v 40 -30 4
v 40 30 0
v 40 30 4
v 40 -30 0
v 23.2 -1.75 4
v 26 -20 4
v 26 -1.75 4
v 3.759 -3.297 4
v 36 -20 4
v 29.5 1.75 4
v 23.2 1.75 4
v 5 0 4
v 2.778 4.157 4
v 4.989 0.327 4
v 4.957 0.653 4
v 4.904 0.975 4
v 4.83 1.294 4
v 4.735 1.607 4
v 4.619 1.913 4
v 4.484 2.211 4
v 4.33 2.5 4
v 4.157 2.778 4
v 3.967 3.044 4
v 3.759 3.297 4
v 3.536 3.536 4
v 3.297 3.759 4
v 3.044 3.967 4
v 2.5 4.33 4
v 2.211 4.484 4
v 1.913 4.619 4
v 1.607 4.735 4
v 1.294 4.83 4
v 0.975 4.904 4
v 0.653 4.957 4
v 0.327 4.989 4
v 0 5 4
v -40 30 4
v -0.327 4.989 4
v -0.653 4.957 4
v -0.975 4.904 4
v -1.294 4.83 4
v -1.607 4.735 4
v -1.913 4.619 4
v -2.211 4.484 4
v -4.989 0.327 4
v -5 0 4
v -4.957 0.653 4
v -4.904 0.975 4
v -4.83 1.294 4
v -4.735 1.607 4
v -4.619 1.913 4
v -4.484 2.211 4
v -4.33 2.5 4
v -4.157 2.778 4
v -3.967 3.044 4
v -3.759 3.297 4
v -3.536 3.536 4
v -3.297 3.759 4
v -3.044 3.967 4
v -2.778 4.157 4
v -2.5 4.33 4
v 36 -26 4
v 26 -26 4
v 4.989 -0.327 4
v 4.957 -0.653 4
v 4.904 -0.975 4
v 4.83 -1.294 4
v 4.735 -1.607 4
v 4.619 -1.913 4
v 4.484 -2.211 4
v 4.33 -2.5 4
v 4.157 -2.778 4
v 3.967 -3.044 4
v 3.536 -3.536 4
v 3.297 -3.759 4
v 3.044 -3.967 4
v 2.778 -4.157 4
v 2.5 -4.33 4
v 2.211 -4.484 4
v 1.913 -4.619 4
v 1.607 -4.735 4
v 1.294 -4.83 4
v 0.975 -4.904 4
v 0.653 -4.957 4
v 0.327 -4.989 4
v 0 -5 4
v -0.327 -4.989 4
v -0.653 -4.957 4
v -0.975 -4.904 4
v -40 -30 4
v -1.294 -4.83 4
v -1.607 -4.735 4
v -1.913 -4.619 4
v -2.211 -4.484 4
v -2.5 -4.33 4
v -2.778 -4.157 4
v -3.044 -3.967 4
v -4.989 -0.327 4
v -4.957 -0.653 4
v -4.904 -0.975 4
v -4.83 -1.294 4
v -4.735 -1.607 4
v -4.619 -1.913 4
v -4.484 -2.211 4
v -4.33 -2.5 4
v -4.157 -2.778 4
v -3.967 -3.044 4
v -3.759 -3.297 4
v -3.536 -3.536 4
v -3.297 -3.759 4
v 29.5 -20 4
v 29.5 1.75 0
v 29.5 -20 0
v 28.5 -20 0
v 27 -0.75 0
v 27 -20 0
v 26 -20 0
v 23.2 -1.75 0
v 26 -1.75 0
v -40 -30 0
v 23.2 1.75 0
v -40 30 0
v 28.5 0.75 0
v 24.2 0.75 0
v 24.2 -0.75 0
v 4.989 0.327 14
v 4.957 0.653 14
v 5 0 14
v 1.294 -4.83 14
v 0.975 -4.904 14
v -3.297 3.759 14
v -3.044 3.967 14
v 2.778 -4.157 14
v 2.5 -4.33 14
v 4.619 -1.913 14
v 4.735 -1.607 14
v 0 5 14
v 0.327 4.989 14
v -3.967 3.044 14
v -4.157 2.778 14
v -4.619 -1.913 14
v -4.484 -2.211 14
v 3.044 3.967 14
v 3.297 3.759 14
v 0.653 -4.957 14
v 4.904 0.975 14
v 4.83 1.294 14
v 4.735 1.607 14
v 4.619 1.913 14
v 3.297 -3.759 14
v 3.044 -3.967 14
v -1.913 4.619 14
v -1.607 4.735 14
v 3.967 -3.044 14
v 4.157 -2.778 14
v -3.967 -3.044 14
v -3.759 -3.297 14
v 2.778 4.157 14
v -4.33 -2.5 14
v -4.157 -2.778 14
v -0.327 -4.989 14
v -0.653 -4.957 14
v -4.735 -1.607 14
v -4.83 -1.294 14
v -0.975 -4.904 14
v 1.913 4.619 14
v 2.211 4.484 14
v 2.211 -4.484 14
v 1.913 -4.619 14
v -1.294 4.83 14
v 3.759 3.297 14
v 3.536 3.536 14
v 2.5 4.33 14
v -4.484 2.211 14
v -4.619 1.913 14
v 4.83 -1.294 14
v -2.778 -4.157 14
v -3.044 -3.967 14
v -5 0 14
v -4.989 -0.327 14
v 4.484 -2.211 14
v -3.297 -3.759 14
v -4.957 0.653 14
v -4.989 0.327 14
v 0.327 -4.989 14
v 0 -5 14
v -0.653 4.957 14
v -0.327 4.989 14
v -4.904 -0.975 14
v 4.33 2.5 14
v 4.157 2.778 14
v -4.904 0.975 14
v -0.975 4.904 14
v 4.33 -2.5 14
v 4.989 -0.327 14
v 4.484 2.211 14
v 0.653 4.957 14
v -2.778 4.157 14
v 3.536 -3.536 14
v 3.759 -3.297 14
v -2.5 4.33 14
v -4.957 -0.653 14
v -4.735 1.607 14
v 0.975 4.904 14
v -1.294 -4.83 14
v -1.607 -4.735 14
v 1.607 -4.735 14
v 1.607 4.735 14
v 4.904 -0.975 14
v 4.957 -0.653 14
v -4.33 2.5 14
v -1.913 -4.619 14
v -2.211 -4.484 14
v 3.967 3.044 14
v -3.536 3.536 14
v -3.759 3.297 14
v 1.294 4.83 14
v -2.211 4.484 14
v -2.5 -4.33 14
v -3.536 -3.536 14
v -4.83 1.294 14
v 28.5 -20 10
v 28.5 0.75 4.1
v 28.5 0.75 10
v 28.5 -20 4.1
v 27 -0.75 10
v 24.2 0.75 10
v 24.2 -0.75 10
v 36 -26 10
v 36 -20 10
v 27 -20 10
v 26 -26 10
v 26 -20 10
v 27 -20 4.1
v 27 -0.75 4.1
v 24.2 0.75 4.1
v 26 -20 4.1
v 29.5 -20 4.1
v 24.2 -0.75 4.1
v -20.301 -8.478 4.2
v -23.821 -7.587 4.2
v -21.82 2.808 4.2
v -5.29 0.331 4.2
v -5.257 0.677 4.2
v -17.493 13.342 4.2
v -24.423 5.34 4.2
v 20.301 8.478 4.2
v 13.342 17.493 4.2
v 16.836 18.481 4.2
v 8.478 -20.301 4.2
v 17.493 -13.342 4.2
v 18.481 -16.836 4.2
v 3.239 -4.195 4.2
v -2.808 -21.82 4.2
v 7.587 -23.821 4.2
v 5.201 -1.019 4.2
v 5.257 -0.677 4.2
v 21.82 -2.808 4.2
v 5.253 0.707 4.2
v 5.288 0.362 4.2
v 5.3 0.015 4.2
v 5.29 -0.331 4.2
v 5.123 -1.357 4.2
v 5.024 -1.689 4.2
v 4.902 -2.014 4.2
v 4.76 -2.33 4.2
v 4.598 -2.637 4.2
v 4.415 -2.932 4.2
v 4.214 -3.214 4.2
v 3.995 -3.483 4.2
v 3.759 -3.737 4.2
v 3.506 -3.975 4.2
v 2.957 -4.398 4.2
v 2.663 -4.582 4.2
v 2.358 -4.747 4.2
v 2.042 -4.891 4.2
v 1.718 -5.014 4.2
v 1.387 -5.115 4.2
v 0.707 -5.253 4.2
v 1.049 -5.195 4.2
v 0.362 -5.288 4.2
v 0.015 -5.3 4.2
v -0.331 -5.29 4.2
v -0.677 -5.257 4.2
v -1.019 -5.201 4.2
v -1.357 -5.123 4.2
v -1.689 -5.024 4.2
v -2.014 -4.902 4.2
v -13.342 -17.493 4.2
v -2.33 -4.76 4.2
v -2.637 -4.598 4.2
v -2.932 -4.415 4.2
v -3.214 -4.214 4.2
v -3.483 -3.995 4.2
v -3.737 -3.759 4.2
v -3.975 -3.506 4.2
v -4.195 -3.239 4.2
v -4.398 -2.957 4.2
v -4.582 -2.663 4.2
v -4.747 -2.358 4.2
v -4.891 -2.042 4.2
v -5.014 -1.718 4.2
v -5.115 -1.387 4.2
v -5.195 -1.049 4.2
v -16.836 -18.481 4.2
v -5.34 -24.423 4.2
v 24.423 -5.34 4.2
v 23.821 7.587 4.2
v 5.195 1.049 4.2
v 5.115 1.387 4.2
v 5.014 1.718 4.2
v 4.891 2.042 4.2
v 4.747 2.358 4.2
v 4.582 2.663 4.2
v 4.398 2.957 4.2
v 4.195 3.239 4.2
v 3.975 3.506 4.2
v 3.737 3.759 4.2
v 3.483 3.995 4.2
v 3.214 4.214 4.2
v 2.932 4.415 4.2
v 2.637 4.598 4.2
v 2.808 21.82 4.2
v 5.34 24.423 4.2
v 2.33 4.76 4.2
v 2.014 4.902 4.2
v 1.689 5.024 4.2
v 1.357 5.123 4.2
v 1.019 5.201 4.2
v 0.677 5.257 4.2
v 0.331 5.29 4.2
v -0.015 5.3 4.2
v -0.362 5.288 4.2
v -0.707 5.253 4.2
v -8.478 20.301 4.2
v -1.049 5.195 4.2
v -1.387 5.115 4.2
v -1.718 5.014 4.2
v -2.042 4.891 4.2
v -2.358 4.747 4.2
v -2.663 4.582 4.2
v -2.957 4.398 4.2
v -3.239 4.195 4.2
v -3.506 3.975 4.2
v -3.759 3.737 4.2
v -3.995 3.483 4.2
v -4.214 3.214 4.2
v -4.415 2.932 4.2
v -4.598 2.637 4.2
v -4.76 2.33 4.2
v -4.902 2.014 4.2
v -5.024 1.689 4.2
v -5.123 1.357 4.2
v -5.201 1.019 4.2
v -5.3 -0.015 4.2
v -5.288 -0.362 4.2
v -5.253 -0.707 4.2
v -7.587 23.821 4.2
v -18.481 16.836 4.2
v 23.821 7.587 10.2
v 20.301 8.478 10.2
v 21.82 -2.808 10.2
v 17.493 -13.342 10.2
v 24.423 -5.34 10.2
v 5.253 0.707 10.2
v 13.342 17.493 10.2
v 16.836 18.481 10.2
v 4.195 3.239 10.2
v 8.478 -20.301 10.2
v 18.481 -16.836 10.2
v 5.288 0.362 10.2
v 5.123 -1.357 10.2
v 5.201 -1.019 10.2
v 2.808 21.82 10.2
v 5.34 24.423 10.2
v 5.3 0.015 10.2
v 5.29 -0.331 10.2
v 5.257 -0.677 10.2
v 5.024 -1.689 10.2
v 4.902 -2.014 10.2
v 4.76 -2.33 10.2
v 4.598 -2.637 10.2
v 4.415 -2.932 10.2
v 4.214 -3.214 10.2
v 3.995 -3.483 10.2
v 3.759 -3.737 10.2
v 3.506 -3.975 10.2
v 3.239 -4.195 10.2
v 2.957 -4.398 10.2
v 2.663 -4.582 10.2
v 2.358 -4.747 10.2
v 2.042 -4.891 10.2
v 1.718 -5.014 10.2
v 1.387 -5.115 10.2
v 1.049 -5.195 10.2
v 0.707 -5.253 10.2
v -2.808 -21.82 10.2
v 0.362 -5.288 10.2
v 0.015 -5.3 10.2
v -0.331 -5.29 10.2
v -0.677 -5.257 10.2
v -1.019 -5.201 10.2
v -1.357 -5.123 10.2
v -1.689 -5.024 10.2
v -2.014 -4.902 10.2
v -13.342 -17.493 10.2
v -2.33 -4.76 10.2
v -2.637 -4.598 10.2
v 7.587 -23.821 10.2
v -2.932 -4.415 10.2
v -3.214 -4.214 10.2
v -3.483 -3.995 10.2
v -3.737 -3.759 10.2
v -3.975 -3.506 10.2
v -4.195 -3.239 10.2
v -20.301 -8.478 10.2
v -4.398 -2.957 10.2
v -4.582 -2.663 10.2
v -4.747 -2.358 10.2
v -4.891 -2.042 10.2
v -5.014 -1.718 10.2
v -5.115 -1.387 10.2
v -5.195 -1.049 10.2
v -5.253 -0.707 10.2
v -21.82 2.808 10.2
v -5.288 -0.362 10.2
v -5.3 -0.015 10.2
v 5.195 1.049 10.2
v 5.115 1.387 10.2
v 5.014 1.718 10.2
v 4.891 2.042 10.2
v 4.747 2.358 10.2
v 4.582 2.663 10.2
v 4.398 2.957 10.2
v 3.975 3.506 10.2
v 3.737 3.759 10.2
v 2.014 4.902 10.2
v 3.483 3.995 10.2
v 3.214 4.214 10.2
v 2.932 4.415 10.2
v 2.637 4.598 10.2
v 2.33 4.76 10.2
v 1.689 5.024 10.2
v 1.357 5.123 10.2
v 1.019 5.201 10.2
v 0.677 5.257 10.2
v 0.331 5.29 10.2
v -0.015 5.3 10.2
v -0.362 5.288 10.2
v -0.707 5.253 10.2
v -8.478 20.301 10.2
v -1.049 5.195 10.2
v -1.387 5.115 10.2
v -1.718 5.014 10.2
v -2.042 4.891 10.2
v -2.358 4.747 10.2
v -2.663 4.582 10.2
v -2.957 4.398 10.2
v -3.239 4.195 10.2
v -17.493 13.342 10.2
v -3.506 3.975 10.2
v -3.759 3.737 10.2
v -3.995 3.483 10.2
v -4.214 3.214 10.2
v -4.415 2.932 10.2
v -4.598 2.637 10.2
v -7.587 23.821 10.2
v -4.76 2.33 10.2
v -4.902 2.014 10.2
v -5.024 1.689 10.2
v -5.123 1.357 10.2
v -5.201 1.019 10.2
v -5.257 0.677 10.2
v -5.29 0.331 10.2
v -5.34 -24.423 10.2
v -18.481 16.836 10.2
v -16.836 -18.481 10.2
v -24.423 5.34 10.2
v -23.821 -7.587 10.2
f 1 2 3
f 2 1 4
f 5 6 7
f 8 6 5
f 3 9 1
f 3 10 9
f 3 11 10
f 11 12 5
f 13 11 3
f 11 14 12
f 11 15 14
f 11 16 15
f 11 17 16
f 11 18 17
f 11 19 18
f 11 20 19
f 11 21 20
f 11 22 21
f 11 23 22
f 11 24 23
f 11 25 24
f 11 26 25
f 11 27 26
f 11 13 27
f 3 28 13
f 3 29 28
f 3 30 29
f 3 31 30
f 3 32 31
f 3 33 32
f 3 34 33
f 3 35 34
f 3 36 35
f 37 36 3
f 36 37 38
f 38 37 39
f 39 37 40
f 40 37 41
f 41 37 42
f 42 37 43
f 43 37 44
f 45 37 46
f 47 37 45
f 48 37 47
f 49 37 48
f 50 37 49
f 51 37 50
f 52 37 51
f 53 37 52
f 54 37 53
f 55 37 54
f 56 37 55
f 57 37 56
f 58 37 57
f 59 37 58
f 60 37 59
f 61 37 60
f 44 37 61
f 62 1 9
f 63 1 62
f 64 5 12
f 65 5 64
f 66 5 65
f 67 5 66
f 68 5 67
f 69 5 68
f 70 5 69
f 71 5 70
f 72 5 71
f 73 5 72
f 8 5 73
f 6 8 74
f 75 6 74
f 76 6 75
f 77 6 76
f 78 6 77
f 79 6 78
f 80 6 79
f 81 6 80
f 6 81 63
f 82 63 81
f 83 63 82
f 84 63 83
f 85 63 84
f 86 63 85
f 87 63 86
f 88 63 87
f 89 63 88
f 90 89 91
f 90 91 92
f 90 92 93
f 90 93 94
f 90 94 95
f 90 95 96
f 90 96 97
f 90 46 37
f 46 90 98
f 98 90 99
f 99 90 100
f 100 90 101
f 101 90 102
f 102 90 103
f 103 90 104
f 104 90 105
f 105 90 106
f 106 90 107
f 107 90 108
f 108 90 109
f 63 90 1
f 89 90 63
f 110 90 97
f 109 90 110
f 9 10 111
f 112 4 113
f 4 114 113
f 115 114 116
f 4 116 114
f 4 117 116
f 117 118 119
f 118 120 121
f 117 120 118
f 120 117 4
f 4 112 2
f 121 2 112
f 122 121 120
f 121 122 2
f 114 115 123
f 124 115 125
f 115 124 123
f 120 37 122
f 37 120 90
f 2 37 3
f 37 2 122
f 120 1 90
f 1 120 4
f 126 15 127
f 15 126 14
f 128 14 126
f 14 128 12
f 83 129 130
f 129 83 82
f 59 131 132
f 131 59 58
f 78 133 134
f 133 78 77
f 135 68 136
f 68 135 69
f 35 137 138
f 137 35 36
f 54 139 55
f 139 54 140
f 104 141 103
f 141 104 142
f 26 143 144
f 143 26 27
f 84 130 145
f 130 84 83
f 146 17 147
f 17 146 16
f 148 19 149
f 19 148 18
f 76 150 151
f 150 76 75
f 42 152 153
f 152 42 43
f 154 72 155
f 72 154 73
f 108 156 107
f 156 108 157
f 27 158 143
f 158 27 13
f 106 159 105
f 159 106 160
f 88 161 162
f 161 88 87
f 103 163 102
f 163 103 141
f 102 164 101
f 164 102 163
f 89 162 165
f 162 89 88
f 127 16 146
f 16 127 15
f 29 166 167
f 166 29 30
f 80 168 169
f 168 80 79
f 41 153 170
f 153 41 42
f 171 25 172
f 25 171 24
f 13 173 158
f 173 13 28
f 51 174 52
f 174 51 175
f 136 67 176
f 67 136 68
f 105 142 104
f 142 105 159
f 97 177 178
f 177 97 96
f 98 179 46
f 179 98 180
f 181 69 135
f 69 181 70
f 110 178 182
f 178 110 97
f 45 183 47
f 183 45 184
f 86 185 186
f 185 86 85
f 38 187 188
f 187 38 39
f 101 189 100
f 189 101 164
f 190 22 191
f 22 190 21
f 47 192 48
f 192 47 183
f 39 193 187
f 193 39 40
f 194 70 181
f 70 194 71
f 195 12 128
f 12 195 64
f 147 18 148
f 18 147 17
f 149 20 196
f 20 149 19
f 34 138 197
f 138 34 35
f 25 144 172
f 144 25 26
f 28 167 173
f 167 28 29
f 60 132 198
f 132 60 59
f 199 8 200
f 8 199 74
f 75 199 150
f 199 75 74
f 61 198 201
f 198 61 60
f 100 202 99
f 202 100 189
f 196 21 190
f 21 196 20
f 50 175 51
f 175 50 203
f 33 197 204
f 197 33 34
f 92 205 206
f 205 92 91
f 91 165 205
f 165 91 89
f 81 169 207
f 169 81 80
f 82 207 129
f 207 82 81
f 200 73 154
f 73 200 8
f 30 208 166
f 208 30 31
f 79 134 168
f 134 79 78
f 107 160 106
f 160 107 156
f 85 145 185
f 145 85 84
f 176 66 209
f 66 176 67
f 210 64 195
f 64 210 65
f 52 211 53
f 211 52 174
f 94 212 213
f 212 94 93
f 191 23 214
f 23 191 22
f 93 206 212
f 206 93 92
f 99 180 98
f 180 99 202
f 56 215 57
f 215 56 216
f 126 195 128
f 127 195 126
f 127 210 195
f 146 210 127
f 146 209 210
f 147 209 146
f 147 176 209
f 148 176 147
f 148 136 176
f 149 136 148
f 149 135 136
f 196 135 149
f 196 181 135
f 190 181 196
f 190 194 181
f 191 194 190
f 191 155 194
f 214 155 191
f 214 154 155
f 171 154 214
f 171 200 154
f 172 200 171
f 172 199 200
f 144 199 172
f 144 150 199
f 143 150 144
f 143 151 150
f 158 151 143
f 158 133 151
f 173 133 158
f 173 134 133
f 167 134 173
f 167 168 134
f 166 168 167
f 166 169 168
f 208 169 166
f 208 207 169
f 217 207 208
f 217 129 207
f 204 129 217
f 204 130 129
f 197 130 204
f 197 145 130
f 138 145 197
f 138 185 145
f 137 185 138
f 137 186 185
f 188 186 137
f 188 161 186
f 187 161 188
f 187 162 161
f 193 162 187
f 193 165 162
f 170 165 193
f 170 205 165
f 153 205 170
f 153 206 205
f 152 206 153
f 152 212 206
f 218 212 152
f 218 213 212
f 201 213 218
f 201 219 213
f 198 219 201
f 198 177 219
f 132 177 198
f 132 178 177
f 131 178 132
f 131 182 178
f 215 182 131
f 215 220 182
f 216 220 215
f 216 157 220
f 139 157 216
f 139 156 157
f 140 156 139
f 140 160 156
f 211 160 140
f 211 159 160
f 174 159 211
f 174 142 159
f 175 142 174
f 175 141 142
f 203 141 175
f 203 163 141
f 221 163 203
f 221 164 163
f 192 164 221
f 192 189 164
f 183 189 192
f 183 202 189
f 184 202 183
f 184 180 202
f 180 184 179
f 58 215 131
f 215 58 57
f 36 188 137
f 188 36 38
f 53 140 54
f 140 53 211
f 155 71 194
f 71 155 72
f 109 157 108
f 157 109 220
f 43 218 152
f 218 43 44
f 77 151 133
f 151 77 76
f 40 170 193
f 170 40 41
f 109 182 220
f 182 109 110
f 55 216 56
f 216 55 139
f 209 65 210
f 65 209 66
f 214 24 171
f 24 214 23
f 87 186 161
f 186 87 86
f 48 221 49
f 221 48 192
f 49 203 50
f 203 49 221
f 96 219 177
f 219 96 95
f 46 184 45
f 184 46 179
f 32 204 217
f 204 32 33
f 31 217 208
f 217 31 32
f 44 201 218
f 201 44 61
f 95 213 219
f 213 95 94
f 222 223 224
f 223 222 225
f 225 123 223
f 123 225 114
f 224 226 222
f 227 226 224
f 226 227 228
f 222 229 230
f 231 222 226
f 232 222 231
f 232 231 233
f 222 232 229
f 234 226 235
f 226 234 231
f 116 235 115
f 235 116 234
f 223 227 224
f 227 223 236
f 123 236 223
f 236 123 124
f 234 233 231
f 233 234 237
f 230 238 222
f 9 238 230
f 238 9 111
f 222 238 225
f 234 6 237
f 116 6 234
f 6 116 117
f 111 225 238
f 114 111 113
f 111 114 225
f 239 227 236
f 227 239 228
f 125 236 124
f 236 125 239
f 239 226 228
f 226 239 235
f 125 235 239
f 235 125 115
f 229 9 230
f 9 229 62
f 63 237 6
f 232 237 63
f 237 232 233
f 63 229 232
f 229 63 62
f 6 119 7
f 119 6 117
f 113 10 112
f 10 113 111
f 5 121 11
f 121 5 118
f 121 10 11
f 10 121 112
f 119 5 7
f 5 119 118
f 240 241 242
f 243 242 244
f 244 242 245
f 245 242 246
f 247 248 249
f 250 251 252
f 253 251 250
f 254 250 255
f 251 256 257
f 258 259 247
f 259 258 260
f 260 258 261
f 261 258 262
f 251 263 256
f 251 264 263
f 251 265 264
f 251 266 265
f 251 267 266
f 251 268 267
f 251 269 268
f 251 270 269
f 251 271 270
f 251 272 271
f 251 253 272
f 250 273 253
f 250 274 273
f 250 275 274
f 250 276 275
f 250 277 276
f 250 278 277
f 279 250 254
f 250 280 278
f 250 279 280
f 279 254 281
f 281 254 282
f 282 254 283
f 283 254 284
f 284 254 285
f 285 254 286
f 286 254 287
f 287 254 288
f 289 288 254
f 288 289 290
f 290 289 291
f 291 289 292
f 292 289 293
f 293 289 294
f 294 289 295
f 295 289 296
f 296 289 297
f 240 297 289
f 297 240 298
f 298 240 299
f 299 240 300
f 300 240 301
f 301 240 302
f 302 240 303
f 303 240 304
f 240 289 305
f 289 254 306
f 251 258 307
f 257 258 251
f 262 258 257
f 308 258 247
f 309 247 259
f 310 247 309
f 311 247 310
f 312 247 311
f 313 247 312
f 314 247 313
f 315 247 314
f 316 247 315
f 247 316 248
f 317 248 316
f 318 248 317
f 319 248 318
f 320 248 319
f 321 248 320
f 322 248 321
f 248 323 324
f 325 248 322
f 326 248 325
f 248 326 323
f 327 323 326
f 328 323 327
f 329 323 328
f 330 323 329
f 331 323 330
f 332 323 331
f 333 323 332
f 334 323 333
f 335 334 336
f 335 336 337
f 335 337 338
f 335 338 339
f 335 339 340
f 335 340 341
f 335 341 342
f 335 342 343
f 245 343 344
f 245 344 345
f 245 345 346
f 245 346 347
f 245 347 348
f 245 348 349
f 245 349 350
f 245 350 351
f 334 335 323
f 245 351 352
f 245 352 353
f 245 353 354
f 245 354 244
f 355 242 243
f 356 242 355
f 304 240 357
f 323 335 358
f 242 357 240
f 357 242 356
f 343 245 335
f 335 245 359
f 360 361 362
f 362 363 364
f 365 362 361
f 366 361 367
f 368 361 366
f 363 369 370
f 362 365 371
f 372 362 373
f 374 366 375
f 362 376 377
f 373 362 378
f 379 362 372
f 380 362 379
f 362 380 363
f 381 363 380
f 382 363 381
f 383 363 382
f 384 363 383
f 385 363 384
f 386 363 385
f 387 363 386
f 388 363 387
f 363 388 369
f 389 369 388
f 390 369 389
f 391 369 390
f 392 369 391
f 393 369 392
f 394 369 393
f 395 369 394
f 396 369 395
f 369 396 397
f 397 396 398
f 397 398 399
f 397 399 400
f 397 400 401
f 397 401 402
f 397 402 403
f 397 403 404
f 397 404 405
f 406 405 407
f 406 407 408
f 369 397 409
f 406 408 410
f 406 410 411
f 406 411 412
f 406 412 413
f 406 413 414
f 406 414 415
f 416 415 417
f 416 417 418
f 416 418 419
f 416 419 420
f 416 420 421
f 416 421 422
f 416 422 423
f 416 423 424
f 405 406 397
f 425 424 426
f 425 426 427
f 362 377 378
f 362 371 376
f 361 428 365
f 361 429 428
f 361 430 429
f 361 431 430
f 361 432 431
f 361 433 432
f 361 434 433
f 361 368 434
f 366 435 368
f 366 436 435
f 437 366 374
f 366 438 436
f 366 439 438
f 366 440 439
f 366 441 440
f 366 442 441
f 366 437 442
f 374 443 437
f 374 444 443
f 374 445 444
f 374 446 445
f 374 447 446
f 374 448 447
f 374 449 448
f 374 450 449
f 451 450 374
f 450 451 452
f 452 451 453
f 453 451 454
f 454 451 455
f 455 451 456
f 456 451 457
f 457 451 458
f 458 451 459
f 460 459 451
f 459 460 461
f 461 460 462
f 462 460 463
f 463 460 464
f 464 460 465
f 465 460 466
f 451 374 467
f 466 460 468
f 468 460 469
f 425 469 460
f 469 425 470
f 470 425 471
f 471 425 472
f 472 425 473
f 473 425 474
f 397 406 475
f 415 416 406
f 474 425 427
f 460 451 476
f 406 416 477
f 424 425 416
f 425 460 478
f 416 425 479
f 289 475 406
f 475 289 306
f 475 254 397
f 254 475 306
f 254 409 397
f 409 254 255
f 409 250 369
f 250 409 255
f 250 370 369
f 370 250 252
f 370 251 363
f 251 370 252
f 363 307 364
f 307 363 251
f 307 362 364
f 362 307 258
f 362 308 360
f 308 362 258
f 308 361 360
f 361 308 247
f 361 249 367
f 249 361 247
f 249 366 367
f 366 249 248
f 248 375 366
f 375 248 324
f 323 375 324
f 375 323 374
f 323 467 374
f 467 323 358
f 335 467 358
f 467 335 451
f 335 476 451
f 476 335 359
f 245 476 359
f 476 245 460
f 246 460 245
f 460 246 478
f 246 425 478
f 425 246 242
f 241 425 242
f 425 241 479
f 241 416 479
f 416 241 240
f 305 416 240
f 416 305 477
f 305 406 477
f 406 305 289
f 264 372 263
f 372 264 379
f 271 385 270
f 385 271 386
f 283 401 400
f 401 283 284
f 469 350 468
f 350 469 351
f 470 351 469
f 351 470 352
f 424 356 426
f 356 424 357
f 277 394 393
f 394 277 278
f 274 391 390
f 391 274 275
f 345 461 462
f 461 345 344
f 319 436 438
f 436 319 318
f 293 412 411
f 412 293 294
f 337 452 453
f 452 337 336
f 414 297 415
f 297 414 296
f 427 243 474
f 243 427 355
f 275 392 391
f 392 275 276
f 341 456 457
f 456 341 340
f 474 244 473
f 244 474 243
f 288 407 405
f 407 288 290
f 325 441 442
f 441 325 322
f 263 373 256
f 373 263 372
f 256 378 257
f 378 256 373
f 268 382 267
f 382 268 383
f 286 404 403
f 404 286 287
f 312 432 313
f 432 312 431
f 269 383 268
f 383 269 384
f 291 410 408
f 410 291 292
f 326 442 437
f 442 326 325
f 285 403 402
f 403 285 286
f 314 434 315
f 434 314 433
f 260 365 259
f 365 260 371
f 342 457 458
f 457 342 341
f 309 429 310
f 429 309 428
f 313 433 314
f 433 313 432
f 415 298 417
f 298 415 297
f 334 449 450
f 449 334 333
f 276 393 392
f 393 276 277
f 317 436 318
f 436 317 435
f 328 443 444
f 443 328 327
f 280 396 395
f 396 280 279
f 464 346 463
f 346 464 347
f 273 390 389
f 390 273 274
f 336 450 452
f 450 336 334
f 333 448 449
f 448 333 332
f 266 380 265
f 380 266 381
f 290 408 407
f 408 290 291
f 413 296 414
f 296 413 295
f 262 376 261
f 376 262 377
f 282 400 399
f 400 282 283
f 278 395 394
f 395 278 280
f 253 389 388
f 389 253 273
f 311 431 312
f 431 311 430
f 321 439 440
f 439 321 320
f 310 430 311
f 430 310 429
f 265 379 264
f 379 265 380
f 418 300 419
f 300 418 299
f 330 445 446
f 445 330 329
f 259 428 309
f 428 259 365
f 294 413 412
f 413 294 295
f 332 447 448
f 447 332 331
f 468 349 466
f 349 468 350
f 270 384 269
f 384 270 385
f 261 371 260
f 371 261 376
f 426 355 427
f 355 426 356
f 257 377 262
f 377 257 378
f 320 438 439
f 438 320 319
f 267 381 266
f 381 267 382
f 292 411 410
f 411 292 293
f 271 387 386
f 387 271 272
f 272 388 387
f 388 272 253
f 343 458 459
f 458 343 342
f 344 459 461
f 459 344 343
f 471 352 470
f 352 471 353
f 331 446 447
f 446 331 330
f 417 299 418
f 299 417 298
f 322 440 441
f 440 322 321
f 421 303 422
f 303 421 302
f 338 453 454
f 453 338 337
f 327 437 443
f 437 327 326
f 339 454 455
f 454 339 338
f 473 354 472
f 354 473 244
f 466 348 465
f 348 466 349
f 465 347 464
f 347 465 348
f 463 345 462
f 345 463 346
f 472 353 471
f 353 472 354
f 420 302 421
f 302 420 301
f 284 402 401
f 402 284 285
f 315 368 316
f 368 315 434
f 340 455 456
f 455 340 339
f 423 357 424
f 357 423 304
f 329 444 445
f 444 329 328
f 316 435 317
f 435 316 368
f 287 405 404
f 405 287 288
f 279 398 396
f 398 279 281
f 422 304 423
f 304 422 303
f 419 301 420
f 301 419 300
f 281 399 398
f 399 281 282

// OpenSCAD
cadverify_only = "";
module instance(name, part, unit = 1) {
    echo(cadverify_instance = [name, part, unit]);
    if (cadverify_only == "" || cadverify_only == name) children();
}

// Part selector: base, wheel, assembly
part = "assembly"; // [base, wheel, assembly]

$fn = 96;

// Parameters
Rt = 25;        // wheel tip radius (50mm across)
Rr = 22;        // wheel root radius
Nteeth = 12;
wheel_t = 6;    // wheel thickness
bore_r = 5.3;   // wheel bore radius (post 5.0 + 0.3 clearance)
post_r = 5;
post_h = 14;    // base bottom to post top
base_t = 4;     // base plate thickness
plate_x = 80;
plate_y = 60;
gap_angle = 37.3333333; // gap center for nominal assembly

module wheel() {
    pts = [ for (k=[0:2*Nteeth-1])
        let(i=floor(k/2),
            a = (k%2==0) ? i*360/Nteeth : i*360/Nteeth+25,
            r = (k%2==0) ? Rr : Rt)
        [r*cos(a), r*sin(a)] ];
    difference() {
        linear_extrude(height=wheel_t, convexity=4)
            polygon(pts);
        translate([0,0,-0.1])
            cylinder(h=wheel_t+0.2, r=bore_r);
    }
}

module base() {
    difference() {
        union() {
            // plate
            translate([-plate_x/2, -plate_y/2, 0])
                cube([plate_x, plate_y, base_t]);
            // post
            cylinder(h=post_h, r=post_r);
            // pawl backbone (tall)
            translate([27, -20, 0])
                cube([1.5, 20.75, 10]);
            // pawl finger (tall, radial)
            translate([24.2, -0.75, 0])
                cube([4.3, 1.5, 10]);
            // anchor block (full height fixation)
            translate([26, -26, 0])
                cube([10, 6, 10]);
        }
        // slot voids through plate (z -0.1..4.1)
        translate([26, -20, -0.1]) cube([1, 19.25, 4.2]);      // west of backbone
        translate([28.5, -20, -0.1]) cube([1, 20.75, 4.2]);    // east of backbone
        translate([23.2, 0.75, -0.1]) cube([6.3, 1, 4.2]);      // north
        translate([23.2, -1.75, -0.1]) cube([3.8, 1, 4.2]);     // south of finger tip
        translate([23.2, -1.75, -0.1]) cube([1, 3.5, 4.2]);     // west of tip
    }
}

if (part == "wheel") {
    echo(cadverify_spec = [
        ["bounds", [[-25, -25, 0], [25, 25, 6]]],
        ["bodies", 1],
        ["through_holes", 1],
        ["support_faces", [["bottom", "-z", 1000]]],
        ["overhangs_allowed", []],
        ["copies", 1],
        ["details", [
            ["hub", "material", [[5, 5, 0.5], [10, 10, 5.5]], 0.9],
            ["bore", "hole", [0, 0, 7], [0, 0, -1], [[0, 10.6], [5, 10.6]]],
            ["rim", "thickness", [15, 0, 7], [0, 0, -1], 6],
            ["teeth", "view", [[20, -15, 0], [25, 15, 6]]]
        ]]
    ]);
    wheel();
} else if (part == "base") {
    echo(cadverify_spec = [
        ["bounds", [[-40, -30, 0], [40, 30, 14]]],
        ["bodies", 1],
        ["through_holes", 1],
        ["support_faces", [["bottom", "-z", 4000]]],
        ["overhangs_allowed", []],
        ["copies", 1],
        ["details", [
            ["pawl_arm", "material", [[27.1, -10, 4.1], [28.4, -5, 9.9]], 0.9],
            ["slot", "void", [[26.1, -15, 0.5], [26.9, -5, 3.5]], 0.9],
            ["base_floor", "thickness", [-20, 20, -1], [0, 0, 1], 4],
            ["pawl_tip", "view", [[23, -2, 4], [26, 2, 10]]]
        ]]
    ]);
    base();
} else if (part == "assembly") {
    echo(cadverify_spec = [
        ["bounds", [[-40, -30, 0], [40, 30, 14]]],
        ["support_faces", [["table", "-z", 4000]]],
        ["motions", [
            ["free", ["wheel1"], "rotate", [0, 0, 4], [0, 0, 1], [0, -30],
                ["flex", [["wheel1", "base1", 1.0, "pawl arm bends as tooth passes"]]]],
            ["locked", ["wheel1"], "rotate", [0, 0, 4], [0, 0, 1], [0, 8],
                ["stops", [8]]]
        ]],
        ["assembly_order", [
            [["base1"], [0, 0, 0]],
            [["wheel1"], [0, 0, -1]]
        ]]
    ]);
    instance("base1", "base") base();
    instance("wheel1", "wheel") translate([0, 0, 4.2]) rotate([0, 0, -gap_angle]) wheel();
}
